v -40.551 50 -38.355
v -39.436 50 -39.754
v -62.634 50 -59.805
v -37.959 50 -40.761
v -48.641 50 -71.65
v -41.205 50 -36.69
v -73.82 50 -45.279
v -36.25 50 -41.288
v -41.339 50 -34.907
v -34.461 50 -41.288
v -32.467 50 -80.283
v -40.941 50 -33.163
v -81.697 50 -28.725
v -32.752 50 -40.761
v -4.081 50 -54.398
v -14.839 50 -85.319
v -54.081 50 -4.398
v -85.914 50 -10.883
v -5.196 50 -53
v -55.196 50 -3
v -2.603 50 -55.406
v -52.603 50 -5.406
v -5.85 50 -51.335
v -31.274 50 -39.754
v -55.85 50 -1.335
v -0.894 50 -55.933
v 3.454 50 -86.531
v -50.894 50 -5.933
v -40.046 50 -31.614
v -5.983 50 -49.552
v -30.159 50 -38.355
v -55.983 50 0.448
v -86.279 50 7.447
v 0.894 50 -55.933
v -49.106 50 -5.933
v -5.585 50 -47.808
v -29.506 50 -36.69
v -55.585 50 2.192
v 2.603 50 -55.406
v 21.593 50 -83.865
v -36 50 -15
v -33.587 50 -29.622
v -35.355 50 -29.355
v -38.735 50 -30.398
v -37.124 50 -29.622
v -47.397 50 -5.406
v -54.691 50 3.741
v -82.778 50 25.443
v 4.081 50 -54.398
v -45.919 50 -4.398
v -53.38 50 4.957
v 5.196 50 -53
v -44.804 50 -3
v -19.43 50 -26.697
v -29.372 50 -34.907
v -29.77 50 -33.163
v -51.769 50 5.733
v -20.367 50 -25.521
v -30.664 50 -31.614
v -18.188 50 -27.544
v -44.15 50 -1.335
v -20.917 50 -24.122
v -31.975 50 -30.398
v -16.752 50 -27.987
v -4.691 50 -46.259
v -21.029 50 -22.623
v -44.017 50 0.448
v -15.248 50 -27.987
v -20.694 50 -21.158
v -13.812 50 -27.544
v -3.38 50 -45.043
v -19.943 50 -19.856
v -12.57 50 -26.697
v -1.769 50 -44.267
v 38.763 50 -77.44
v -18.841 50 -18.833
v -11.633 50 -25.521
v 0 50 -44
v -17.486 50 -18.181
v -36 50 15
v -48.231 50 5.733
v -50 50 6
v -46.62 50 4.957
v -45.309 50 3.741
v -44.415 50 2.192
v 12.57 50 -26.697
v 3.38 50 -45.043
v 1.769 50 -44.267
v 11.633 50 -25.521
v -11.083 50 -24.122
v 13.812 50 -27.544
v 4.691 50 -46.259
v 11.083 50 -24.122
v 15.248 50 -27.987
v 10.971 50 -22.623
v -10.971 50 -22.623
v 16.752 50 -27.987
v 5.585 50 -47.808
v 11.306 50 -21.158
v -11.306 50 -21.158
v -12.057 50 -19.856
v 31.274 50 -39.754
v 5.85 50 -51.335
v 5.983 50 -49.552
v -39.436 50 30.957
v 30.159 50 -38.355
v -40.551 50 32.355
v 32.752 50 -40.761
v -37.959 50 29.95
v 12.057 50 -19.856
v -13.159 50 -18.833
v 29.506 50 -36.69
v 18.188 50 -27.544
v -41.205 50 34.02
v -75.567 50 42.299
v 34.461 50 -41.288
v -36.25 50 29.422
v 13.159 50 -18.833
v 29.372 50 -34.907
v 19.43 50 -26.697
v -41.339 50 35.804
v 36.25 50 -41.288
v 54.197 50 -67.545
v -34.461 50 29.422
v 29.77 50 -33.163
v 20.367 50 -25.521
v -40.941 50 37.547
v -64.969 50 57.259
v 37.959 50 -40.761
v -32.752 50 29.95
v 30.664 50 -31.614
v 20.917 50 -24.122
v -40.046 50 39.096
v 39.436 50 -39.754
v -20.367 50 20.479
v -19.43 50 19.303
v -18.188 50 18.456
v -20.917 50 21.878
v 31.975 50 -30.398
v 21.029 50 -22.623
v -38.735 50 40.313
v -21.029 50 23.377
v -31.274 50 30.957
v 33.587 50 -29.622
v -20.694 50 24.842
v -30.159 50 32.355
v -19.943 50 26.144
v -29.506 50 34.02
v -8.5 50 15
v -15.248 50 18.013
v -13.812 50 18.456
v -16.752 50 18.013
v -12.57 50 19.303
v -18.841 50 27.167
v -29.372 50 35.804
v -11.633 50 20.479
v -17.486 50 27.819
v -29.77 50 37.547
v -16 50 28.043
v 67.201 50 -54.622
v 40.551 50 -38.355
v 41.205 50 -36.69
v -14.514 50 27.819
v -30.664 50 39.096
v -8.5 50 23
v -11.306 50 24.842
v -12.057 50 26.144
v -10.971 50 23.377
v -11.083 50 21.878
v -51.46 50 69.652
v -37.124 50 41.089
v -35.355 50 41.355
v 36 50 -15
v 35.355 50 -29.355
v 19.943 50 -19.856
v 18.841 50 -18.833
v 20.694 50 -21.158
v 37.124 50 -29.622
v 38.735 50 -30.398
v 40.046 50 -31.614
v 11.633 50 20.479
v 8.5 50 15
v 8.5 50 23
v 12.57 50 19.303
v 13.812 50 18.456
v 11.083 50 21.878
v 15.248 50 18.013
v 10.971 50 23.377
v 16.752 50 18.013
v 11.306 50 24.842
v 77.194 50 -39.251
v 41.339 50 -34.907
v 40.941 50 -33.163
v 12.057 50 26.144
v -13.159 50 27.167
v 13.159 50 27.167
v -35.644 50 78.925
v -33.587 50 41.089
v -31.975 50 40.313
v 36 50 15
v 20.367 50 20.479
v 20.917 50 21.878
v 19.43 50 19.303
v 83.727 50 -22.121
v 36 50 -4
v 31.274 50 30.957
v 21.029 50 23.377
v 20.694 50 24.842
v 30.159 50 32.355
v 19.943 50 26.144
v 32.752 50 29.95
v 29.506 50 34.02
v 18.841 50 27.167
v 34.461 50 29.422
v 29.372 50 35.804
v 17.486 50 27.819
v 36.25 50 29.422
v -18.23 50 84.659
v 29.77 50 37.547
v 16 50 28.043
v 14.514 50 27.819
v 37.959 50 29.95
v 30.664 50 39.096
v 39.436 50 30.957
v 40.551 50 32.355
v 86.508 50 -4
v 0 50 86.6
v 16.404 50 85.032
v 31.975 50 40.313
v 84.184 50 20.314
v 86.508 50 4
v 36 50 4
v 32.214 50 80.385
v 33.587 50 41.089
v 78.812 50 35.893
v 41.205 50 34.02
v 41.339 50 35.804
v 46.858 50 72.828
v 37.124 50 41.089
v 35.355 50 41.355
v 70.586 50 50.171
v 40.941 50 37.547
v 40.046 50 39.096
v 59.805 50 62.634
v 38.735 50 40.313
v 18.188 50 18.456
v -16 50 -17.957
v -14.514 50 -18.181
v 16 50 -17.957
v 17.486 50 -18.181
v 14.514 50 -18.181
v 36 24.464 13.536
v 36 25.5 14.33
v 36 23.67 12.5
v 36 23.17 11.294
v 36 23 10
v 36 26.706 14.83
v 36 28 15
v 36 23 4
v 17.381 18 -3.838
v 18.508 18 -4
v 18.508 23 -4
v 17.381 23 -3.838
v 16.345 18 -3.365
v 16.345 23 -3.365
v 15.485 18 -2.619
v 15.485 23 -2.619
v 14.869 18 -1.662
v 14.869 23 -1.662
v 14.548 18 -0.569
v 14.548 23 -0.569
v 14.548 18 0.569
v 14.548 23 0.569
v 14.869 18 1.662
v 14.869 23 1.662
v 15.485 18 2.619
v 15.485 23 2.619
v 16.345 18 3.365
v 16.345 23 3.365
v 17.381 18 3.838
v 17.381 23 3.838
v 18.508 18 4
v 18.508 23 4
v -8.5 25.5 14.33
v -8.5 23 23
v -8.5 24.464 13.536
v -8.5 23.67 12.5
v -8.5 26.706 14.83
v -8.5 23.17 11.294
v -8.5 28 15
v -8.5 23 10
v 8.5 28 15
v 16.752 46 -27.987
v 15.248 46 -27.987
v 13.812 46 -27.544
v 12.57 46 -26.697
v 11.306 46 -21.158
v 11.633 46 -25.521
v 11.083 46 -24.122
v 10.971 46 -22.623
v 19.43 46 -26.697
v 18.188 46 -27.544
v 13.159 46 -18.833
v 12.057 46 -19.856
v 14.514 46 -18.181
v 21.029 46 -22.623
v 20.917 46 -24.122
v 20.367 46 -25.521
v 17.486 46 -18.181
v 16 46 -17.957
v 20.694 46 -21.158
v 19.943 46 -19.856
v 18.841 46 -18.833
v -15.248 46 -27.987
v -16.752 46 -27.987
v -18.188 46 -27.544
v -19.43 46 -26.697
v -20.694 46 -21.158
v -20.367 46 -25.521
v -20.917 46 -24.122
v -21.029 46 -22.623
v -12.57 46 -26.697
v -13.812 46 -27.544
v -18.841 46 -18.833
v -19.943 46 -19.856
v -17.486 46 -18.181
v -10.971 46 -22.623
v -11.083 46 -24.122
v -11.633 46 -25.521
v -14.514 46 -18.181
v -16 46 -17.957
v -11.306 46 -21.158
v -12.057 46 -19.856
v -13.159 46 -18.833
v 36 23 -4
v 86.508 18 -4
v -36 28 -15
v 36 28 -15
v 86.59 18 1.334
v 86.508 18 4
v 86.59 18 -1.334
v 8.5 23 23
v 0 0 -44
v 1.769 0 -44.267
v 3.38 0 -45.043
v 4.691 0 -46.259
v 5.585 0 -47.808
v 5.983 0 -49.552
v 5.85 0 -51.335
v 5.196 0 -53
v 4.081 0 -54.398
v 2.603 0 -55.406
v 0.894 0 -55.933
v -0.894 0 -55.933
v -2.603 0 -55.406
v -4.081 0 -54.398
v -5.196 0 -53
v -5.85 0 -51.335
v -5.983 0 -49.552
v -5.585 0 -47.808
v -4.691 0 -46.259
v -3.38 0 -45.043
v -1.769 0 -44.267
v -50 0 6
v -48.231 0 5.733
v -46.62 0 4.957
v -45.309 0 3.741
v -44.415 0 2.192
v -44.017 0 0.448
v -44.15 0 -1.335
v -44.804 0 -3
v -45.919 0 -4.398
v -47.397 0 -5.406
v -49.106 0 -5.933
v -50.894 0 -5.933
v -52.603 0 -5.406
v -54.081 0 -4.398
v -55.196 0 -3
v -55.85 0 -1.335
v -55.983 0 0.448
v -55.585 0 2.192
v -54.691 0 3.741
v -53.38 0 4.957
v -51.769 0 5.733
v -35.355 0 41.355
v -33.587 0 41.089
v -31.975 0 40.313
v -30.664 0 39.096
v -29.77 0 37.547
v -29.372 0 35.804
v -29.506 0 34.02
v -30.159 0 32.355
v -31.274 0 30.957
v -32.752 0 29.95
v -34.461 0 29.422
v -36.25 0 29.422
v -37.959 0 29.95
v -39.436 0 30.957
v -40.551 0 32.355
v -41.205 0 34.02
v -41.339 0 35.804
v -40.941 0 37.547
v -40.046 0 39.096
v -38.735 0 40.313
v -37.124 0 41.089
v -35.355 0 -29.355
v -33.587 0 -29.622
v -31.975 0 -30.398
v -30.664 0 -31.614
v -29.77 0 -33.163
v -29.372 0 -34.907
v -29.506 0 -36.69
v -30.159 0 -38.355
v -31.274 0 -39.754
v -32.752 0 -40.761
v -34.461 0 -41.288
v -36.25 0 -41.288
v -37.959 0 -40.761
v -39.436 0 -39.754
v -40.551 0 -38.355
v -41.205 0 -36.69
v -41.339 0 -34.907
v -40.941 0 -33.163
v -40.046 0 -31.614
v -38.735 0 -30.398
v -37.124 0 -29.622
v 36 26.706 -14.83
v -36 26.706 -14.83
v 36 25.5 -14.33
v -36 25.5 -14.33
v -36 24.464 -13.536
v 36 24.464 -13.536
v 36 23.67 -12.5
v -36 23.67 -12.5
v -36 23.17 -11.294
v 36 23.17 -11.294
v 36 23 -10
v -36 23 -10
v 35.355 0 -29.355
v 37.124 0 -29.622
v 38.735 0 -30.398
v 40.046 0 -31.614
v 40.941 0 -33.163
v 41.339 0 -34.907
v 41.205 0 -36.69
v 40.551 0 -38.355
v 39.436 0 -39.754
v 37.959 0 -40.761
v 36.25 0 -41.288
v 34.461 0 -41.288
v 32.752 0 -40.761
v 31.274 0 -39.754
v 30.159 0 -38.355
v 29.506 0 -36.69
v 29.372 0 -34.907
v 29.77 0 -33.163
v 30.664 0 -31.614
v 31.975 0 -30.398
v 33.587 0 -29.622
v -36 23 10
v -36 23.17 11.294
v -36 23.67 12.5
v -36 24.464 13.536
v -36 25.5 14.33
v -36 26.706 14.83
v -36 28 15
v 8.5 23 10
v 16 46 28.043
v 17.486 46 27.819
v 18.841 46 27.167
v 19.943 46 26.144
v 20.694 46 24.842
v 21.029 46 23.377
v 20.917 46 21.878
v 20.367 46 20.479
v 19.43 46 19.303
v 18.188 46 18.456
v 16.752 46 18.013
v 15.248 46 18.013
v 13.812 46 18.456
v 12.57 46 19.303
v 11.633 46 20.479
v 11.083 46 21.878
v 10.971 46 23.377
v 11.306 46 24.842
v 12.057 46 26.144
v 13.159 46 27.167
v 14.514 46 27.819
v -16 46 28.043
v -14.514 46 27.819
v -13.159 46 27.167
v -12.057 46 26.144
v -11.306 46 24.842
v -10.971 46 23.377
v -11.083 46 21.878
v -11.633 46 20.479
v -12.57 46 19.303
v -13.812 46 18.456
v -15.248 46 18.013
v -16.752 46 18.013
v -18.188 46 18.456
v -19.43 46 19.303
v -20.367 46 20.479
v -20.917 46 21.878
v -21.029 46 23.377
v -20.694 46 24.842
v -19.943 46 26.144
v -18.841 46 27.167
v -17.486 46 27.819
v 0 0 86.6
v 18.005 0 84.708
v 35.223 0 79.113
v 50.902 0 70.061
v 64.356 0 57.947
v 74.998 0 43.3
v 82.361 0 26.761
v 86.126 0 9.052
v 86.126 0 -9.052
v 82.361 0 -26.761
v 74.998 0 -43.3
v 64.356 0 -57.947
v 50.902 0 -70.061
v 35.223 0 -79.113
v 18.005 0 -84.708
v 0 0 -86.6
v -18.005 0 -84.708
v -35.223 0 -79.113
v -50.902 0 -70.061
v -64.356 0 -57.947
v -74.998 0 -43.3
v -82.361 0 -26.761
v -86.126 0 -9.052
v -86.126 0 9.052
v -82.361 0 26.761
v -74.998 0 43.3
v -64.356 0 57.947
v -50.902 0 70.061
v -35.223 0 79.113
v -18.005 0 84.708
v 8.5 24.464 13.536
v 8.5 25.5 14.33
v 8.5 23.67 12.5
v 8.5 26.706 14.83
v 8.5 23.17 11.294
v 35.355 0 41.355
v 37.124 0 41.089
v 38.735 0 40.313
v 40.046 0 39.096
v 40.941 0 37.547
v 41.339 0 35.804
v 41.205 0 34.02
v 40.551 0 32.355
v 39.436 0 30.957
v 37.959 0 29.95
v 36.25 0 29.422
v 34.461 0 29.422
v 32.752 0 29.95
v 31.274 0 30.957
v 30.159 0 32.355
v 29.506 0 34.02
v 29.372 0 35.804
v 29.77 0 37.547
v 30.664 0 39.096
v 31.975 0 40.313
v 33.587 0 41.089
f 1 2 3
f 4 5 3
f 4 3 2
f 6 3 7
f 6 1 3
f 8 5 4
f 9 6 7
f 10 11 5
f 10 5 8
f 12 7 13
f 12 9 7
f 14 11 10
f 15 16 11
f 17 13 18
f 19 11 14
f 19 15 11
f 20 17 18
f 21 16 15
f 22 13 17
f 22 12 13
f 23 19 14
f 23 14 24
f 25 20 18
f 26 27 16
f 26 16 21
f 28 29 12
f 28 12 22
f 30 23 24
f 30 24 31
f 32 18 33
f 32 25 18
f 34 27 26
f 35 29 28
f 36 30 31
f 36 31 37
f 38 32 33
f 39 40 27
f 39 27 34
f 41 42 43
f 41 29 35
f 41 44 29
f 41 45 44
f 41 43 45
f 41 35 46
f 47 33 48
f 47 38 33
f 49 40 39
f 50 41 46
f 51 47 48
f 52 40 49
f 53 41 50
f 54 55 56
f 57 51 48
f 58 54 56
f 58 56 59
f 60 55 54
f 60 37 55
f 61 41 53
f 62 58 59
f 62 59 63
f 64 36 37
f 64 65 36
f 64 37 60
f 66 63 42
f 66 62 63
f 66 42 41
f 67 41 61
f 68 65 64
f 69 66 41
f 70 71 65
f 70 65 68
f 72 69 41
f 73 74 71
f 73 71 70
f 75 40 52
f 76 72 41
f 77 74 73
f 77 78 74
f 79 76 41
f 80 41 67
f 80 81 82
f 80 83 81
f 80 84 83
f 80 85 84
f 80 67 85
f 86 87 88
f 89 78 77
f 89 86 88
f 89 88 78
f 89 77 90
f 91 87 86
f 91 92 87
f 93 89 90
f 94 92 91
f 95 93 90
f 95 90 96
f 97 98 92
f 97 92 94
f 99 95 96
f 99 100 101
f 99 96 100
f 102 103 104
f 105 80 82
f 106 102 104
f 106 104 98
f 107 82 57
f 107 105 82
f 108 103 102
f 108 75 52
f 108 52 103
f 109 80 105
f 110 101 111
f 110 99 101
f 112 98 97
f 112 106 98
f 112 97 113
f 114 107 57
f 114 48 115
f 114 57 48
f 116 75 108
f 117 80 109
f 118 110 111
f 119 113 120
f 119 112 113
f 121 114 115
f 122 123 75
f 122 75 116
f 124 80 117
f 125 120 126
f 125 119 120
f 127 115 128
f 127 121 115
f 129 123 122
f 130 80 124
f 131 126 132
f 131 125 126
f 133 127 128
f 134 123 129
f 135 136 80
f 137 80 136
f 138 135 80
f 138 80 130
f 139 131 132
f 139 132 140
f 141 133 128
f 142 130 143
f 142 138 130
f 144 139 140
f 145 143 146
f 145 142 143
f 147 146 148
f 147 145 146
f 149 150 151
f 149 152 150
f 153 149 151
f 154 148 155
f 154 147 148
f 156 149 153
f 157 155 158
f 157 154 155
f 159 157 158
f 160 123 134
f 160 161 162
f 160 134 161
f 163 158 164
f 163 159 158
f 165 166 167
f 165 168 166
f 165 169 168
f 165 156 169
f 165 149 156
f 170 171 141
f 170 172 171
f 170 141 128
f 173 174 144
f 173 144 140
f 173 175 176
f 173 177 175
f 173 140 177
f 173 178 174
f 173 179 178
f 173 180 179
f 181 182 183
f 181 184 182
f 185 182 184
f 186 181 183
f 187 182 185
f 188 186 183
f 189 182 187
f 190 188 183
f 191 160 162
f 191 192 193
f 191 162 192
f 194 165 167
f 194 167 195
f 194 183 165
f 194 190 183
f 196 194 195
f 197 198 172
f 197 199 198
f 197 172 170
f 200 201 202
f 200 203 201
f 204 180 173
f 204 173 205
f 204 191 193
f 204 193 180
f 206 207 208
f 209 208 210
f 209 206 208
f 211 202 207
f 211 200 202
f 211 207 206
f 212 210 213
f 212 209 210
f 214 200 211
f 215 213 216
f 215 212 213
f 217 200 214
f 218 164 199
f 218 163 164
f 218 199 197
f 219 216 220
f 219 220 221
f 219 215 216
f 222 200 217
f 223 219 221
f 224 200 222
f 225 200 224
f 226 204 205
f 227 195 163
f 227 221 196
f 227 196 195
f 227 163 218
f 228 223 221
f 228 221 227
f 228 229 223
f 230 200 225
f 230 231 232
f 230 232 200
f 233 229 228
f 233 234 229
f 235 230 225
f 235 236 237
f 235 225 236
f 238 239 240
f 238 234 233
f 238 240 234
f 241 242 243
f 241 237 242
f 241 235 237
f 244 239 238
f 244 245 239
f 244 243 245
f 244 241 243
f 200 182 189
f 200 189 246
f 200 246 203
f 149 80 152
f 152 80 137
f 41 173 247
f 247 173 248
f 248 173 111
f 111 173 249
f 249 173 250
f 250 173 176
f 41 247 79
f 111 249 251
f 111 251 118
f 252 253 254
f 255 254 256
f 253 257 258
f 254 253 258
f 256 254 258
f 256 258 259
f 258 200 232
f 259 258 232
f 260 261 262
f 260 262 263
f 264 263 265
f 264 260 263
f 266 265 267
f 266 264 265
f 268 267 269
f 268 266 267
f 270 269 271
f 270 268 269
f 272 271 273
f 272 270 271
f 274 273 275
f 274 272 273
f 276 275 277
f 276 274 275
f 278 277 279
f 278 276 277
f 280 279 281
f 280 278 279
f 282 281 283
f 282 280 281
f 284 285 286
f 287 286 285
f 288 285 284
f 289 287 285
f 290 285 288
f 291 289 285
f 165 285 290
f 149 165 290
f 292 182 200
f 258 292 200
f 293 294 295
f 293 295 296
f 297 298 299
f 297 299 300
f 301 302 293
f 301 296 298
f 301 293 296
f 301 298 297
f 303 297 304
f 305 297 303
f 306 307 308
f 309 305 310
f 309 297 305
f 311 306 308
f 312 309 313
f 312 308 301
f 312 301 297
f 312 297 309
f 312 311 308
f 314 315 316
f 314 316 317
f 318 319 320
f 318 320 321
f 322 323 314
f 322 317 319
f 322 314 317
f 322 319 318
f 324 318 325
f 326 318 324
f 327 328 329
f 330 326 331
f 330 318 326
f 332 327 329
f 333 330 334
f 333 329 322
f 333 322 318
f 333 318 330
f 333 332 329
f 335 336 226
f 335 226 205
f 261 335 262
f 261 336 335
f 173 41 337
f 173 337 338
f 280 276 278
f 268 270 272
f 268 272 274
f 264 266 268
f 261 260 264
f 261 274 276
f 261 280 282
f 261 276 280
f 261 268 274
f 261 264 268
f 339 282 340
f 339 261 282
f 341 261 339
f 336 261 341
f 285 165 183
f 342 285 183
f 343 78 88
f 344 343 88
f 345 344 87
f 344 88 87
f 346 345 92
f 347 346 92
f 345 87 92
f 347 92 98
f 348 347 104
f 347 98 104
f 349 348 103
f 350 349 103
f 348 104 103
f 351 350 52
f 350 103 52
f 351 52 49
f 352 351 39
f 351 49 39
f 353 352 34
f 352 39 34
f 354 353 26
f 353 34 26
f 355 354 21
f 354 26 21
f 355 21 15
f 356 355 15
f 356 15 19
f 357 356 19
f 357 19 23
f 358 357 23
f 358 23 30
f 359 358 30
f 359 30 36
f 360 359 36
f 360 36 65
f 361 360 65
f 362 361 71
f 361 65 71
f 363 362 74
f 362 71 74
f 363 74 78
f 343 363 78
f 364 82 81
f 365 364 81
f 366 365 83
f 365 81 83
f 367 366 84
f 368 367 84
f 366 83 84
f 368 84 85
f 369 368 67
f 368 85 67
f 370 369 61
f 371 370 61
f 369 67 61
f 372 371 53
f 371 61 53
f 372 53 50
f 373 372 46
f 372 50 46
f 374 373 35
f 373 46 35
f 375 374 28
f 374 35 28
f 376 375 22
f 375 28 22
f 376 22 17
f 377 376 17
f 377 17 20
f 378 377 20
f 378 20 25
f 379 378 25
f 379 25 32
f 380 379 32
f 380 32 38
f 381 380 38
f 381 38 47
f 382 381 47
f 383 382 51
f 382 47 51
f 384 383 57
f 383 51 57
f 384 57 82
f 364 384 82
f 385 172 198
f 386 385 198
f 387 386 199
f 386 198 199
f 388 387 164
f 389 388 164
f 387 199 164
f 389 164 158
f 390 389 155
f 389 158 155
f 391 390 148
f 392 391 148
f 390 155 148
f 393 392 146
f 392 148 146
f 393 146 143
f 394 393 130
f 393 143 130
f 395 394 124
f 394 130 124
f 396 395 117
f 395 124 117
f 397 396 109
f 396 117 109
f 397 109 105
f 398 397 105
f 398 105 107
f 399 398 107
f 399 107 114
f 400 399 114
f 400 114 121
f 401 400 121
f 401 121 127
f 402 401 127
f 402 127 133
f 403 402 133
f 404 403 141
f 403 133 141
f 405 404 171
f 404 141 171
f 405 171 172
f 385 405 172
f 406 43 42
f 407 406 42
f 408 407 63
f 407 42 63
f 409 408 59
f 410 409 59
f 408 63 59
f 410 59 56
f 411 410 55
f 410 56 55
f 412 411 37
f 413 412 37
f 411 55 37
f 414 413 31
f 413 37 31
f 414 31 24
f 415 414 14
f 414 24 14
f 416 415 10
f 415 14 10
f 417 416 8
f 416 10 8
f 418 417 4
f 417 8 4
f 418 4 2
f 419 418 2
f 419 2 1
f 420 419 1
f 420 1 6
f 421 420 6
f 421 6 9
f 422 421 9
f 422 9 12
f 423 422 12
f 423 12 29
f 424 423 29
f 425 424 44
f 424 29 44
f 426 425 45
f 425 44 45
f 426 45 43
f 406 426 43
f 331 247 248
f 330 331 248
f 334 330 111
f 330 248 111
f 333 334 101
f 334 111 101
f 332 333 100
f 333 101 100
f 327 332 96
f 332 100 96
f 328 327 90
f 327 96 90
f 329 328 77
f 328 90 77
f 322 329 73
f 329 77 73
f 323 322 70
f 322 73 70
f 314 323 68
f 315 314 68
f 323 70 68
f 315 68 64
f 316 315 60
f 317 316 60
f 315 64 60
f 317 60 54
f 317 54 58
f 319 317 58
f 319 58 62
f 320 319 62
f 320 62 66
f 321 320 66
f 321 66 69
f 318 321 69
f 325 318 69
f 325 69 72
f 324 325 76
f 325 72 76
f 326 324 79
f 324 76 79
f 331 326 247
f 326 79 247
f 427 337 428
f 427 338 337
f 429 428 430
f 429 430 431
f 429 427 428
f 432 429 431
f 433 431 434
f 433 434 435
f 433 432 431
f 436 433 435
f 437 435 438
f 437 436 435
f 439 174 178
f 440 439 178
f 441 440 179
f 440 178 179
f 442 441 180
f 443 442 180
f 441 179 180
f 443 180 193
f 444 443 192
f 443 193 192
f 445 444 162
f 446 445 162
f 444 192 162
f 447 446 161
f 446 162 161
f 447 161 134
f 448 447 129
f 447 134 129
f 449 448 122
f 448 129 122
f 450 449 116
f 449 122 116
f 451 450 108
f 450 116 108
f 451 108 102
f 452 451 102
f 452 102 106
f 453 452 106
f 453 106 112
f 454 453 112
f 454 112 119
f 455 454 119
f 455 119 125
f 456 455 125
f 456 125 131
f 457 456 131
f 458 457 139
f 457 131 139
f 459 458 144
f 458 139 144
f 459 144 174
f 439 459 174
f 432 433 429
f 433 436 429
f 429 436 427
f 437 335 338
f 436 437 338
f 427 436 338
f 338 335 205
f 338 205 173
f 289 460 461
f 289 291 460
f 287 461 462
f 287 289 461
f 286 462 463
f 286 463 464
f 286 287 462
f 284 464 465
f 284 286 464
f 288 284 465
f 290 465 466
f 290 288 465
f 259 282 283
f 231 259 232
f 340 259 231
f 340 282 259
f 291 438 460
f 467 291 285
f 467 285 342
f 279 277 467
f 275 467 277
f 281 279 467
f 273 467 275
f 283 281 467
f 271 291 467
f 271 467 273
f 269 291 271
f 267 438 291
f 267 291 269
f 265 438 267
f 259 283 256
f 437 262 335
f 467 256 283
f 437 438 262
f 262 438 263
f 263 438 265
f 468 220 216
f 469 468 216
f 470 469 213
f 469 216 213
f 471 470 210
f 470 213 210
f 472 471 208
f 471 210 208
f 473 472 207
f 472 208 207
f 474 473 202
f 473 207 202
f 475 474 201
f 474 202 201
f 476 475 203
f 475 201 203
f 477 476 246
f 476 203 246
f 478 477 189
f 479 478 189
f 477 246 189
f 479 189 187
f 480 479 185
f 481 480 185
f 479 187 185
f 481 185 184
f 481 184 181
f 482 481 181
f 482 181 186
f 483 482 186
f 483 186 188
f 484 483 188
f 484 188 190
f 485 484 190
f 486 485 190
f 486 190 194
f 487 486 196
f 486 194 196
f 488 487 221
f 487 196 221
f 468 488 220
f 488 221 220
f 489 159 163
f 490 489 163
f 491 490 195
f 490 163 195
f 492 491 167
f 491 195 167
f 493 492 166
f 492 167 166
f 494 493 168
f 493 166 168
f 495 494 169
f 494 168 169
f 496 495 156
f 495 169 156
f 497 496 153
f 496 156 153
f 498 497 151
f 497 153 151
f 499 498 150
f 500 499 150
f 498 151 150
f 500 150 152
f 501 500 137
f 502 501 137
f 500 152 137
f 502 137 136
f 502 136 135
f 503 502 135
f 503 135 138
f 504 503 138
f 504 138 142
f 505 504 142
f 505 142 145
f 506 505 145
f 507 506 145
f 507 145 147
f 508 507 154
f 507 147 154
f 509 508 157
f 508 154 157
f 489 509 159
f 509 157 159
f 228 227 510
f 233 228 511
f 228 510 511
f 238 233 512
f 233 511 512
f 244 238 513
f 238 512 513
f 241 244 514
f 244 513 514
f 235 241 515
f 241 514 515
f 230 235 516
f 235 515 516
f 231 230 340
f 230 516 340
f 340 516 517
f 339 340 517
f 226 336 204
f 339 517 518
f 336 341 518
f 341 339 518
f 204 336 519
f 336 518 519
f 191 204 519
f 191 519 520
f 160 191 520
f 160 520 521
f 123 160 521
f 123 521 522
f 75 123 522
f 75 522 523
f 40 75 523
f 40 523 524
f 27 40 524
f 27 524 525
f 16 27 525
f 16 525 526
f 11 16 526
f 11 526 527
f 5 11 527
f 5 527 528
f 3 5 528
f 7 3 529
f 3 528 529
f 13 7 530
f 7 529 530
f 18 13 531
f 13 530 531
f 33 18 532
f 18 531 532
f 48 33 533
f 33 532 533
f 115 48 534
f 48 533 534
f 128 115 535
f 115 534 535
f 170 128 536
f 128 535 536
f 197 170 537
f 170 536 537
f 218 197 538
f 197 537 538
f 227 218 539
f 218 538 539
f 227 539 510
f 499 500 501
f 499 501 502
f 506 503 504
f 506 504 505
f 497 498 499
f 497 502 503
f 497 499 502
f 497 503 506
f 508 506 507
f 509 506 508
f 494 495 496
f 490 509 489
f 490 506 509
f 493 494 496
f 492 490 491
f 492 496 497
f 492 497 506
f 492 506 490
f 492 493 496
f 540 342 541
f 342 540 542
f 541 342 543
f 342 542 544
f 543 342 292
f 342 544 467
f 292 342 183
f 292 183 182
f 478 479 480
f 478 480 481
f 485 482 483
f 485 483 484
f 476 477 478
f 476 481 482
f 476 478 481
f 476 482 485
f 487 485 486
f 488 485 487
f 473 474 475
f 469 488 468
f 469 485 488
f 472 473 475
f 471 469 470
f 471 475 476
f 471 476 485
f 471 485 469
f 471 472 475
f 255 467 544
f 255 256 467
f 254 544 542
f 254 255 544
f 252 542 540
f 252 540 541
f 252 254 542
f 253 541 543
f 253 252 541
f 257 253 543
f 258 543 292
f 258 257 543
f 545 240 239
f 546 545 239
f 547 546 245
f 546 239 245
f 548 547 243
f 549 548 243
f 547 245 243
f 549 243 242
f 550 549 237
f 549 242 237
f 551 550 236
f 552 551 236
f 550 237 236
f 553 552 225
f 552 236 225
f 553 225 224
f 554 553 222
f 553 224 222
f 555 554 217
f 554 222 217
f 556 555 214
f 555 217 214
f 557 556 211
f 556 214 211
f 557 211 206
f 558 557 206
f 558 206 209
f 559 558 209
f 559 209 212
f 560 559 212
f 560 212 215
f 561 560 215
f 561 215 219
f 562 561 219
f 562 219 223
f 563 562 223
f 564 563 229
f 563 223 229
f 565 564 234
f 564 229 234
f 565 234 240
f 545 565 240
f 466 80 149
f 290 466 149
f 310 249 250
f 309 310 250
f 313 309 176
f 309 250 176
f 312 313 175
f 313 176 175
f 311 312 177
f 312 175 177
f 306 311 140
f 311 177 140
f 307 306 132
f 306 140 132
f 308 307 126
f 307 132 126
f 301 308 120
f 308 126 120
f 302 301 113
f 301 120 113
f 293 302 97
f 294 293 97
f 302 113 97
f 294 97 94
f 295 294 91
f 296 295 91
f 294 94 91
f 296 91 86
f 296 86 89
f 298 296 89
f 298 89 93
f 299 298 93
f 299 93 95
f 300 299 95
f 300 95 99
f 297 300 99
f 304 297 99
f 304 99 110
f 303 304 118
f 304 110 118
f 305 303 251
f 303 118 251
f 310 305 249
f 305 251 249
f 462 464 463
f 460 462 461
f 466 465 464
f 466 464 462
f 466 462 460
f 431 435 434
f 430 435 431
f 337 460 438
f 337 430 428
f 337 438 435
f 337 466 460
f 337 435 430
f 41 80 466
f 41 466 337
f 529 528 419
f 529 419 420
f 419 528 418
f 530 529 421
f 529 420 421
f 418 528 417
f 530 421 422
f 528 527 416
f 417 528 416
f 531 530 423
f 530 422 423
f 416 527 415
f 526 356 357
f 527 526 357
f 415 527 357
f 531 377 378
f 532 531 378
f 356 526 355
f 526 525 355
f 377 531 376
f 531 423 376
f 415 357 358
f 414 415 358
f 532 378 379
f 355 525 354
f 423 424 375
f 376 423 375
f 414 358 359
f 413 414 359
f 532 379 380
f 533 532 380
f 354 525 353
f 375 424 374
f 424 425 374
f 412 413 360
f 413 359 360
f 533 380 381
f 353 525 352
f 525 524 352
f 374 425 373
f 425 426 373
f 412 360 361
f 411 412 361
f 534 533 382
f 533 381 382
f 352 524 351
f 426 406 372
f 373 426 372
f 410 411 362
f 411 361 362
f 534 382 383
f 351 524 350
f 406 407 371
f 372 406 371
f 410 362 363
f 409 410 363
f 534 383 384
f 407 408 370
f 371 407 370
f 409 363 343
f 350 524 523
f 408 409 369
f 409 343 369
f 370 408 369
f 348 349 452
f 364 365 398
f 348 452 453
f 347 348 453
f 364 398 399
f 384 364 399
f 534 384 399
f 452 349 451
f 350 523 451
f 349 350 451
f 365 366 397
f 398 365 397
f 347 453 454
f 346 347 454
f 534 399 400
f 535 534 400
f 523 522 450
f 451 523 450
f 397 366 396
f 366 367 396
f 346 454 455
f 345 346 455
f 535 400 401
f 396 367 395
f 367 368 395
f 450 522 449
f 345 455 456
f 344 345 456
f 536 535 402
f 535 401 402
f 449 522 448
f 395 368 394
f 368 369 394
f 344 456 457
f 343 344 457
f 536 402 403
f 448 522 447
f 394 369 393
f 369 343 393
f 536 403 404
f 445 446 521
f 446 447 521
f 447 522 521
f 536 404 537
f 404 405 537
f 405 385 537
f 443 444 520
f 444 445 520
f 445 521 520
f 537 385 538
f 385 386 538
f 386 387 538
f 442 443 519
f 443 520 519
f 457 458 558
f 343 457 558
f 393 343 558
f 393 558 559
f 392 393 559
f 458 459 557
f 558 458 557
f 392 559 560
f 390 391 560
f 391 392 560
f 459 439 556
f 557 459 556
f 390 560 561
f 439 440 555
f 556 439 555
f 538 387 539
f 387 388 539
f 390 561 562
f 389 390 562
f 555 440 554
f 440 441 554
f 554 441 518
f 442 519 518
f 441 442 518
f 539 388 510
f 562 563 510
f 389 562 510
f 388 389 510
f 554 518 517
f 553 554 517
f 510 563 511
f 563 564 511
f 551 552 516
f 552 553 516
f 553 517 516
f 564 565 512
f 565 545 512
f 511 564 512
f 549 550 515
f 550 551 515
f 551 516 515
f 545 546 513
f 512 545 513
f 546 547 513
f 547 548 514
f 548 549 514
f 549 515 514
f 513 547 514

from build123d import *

# Parameters (mm, degrees)
SKETCH1_R           = 86.6
BOSS_EXTRUDE1_DEPTH = 50
SKETCH2_R           = 6
CUT_EXTRUDE1_DEPTH  = 50
SKETCH3_W           = 8.5
SKETCH3_H           = 8
SKETCH3_W_2         = 72
SKETCH3_H_2         = 30
CUT_EXTRUDE2_DEPTH  = 27
FILLET1_R           = 5
FILLET2_R           = 5
CUT_EXTRUDE3_START  = -32
SKETCH4_R           = 4
CUT_EXTRUDE3_DEPTH  = 32
SKETCH5_R           = 5.042988513
CUT_EXTRUDE4_DEPTH  = 4


with BuildPart() as part:
    # Sketch1 → Boss-Extrude1 (new body)
    with BuildSketch(Plane(origin=(0, 0, 0), x_dir=(1, 0, 0), z_dir=(0, 1, 0))):
        with Locations(Location((0, 0, 0), (0, 0, 270))):
            Circle(SKETCH1_R)
    extrude(amount=BOSS_EXTRUDE1_DEPTH)

    # Sketch2 → Cut-Extrude1 (cut)
    with BuildSketch(Plane(origin=(0, 50, 0), x_dir=(1, 0, 0), z_dir=(0, 1, 0))):
        with Locations(Location((0, 50, 0), (0, 0, 270))):
            Circle(SKETCH2_R)
        with Locations(Location((35.355339059, 35.355339059, 0), (0, 0, 270))):
            Circle(SKETCH2_R)
        with Locations(Location((35.355339059, -35.355339059, 0), (0, 0, 270))):
            Circle(SKETCH2_R)
        with Locations(Location((-35.355339059, -35.355339059, 0), (0, 0, 270))):
            Circle(SKETCH2_R)
        with Locations(Location((-50, 0, 0), (0, 0, 270))):
            Circle(SKETCH2_R)
        with Locations(Location((-35.355339059, 35.355339059, 0), (0, 0, 270))):
            Circle(SKETCH2_R)
    extrude(amount=-CUT_EXTRUDE1_DEPTH, mode=Mode.SUBTRACT)

    # Sketch3 → Cut-Extrude2 (cut)
    with BuildSketch(Plane(origin=(0, 50, 0), x_dir=(1, 0, 0), z_dir=(0, 1, 0))):
        with Locations((4.25, -19)):
            Rectangle(SKETCH3_W, SKETCH3_H)
        with Locations((-4.25, -19)):
            Rectangle(SKETCH3_W, SKETCH3_H)
        Rectangle(SKETCH3_W_2, SKETCH3_H_2)
    extrude(amount=-CUT_EXTRUDE2_DEPTH, mode=Mode.SUBTRACT)

    # Fillet1
    fillet1_edges = [part.edges().sort_by_distance(p)[0] for p in [
        (0, 23, -15),
    ]]
    fillet(fillet1_edges, radius=FILLET1_R)

    # Fillet2
    fillet2_edges = [part.edges().sort_by_distance(p)[0] for p in [
        (-22.25, 23, 15),
        (22.25, 23, 15),
    ]]
    fillet(fillet2_edges, radius=FILLET2_R)

    # Sketch4 → Cut-Extrude3 (cut)
    with BuildSketch(Plane(origin=(0, 50, 0), x_dir=(1, 0, 0), z_dir=(0, 1, 0)).offset(CUT_EXTRUDE3_START)):
        with BuildLine():
            Line((86.507571923, 4), (36, 4))
            Line((36, 4), (36, -4))
            Line((36, -4), (86.507571923, -4))
            ThreePointArc((86.507571923, -4), (86.576889897, -2.000533863), (86.6, 0))
            ThreePointArc((86.6, 0), (86.576889897, 2.000533863), (86.507571923, 4))
        make_face()
        with BuildLine():
            Line((36, 4), (18.507571923, 4))
            ThreePointArc((18.507571923, 4), (21.335999048, 2.828427125), (22.507571923, 0))
            ThreePointArc((22.507571923, 0), (21.335999048, -2.828427125), (18.507571923, -4))
            Line((18.507571923, -4), (36, -4))
            Line((36, -4), (36, 4))
        make_face()
        with Locations((18.507571923, 0)):
            Circle(SKETCH4_R)
        with BuildLine():
            ThreePointArc((86.507571923, -4), (90.507571923, 0), (86.507571923, 4))
            ThreePointArc((86.507571923, 4), (86.576889897, 2.000533863), (86.6, 0))
            ThreePointArc((86.6, 0), (86.576889897, -2.000533863), (86.507571923, -4))
        make_face()
    extrude(amount=CUT_EXTRUDE3_DEPTH, mode=Mode.SUBTRACT)

    # Sketch5 → Cut-Extrude4 (cut)
    with BuildSketch(Plane(origin=(0, 50, 0), x_dir=(1, 0, 0), z_dir=(0, 1, 0))):
        with Locations(Location((-16, -23, 0), (0, 0, 270))):
            Circle(SKETCH5_R)
        with Locations(Location((16, -23, 0), (0, 0, 270))):
            Circle(SKETCH5_R)
        with Locations(Location((16, 23, 0), (0, 0, 270))):
            Circle(SKETCH5_R)
        with Locations(Location((-16, 23, 0), (0, 0, 270))):
            Circle(SKETCH5_R)
    extrude(amount=-CUT_EXTRUDE4_DEPTH, mode=Mode.SUBTRACT)


solid = part.part
